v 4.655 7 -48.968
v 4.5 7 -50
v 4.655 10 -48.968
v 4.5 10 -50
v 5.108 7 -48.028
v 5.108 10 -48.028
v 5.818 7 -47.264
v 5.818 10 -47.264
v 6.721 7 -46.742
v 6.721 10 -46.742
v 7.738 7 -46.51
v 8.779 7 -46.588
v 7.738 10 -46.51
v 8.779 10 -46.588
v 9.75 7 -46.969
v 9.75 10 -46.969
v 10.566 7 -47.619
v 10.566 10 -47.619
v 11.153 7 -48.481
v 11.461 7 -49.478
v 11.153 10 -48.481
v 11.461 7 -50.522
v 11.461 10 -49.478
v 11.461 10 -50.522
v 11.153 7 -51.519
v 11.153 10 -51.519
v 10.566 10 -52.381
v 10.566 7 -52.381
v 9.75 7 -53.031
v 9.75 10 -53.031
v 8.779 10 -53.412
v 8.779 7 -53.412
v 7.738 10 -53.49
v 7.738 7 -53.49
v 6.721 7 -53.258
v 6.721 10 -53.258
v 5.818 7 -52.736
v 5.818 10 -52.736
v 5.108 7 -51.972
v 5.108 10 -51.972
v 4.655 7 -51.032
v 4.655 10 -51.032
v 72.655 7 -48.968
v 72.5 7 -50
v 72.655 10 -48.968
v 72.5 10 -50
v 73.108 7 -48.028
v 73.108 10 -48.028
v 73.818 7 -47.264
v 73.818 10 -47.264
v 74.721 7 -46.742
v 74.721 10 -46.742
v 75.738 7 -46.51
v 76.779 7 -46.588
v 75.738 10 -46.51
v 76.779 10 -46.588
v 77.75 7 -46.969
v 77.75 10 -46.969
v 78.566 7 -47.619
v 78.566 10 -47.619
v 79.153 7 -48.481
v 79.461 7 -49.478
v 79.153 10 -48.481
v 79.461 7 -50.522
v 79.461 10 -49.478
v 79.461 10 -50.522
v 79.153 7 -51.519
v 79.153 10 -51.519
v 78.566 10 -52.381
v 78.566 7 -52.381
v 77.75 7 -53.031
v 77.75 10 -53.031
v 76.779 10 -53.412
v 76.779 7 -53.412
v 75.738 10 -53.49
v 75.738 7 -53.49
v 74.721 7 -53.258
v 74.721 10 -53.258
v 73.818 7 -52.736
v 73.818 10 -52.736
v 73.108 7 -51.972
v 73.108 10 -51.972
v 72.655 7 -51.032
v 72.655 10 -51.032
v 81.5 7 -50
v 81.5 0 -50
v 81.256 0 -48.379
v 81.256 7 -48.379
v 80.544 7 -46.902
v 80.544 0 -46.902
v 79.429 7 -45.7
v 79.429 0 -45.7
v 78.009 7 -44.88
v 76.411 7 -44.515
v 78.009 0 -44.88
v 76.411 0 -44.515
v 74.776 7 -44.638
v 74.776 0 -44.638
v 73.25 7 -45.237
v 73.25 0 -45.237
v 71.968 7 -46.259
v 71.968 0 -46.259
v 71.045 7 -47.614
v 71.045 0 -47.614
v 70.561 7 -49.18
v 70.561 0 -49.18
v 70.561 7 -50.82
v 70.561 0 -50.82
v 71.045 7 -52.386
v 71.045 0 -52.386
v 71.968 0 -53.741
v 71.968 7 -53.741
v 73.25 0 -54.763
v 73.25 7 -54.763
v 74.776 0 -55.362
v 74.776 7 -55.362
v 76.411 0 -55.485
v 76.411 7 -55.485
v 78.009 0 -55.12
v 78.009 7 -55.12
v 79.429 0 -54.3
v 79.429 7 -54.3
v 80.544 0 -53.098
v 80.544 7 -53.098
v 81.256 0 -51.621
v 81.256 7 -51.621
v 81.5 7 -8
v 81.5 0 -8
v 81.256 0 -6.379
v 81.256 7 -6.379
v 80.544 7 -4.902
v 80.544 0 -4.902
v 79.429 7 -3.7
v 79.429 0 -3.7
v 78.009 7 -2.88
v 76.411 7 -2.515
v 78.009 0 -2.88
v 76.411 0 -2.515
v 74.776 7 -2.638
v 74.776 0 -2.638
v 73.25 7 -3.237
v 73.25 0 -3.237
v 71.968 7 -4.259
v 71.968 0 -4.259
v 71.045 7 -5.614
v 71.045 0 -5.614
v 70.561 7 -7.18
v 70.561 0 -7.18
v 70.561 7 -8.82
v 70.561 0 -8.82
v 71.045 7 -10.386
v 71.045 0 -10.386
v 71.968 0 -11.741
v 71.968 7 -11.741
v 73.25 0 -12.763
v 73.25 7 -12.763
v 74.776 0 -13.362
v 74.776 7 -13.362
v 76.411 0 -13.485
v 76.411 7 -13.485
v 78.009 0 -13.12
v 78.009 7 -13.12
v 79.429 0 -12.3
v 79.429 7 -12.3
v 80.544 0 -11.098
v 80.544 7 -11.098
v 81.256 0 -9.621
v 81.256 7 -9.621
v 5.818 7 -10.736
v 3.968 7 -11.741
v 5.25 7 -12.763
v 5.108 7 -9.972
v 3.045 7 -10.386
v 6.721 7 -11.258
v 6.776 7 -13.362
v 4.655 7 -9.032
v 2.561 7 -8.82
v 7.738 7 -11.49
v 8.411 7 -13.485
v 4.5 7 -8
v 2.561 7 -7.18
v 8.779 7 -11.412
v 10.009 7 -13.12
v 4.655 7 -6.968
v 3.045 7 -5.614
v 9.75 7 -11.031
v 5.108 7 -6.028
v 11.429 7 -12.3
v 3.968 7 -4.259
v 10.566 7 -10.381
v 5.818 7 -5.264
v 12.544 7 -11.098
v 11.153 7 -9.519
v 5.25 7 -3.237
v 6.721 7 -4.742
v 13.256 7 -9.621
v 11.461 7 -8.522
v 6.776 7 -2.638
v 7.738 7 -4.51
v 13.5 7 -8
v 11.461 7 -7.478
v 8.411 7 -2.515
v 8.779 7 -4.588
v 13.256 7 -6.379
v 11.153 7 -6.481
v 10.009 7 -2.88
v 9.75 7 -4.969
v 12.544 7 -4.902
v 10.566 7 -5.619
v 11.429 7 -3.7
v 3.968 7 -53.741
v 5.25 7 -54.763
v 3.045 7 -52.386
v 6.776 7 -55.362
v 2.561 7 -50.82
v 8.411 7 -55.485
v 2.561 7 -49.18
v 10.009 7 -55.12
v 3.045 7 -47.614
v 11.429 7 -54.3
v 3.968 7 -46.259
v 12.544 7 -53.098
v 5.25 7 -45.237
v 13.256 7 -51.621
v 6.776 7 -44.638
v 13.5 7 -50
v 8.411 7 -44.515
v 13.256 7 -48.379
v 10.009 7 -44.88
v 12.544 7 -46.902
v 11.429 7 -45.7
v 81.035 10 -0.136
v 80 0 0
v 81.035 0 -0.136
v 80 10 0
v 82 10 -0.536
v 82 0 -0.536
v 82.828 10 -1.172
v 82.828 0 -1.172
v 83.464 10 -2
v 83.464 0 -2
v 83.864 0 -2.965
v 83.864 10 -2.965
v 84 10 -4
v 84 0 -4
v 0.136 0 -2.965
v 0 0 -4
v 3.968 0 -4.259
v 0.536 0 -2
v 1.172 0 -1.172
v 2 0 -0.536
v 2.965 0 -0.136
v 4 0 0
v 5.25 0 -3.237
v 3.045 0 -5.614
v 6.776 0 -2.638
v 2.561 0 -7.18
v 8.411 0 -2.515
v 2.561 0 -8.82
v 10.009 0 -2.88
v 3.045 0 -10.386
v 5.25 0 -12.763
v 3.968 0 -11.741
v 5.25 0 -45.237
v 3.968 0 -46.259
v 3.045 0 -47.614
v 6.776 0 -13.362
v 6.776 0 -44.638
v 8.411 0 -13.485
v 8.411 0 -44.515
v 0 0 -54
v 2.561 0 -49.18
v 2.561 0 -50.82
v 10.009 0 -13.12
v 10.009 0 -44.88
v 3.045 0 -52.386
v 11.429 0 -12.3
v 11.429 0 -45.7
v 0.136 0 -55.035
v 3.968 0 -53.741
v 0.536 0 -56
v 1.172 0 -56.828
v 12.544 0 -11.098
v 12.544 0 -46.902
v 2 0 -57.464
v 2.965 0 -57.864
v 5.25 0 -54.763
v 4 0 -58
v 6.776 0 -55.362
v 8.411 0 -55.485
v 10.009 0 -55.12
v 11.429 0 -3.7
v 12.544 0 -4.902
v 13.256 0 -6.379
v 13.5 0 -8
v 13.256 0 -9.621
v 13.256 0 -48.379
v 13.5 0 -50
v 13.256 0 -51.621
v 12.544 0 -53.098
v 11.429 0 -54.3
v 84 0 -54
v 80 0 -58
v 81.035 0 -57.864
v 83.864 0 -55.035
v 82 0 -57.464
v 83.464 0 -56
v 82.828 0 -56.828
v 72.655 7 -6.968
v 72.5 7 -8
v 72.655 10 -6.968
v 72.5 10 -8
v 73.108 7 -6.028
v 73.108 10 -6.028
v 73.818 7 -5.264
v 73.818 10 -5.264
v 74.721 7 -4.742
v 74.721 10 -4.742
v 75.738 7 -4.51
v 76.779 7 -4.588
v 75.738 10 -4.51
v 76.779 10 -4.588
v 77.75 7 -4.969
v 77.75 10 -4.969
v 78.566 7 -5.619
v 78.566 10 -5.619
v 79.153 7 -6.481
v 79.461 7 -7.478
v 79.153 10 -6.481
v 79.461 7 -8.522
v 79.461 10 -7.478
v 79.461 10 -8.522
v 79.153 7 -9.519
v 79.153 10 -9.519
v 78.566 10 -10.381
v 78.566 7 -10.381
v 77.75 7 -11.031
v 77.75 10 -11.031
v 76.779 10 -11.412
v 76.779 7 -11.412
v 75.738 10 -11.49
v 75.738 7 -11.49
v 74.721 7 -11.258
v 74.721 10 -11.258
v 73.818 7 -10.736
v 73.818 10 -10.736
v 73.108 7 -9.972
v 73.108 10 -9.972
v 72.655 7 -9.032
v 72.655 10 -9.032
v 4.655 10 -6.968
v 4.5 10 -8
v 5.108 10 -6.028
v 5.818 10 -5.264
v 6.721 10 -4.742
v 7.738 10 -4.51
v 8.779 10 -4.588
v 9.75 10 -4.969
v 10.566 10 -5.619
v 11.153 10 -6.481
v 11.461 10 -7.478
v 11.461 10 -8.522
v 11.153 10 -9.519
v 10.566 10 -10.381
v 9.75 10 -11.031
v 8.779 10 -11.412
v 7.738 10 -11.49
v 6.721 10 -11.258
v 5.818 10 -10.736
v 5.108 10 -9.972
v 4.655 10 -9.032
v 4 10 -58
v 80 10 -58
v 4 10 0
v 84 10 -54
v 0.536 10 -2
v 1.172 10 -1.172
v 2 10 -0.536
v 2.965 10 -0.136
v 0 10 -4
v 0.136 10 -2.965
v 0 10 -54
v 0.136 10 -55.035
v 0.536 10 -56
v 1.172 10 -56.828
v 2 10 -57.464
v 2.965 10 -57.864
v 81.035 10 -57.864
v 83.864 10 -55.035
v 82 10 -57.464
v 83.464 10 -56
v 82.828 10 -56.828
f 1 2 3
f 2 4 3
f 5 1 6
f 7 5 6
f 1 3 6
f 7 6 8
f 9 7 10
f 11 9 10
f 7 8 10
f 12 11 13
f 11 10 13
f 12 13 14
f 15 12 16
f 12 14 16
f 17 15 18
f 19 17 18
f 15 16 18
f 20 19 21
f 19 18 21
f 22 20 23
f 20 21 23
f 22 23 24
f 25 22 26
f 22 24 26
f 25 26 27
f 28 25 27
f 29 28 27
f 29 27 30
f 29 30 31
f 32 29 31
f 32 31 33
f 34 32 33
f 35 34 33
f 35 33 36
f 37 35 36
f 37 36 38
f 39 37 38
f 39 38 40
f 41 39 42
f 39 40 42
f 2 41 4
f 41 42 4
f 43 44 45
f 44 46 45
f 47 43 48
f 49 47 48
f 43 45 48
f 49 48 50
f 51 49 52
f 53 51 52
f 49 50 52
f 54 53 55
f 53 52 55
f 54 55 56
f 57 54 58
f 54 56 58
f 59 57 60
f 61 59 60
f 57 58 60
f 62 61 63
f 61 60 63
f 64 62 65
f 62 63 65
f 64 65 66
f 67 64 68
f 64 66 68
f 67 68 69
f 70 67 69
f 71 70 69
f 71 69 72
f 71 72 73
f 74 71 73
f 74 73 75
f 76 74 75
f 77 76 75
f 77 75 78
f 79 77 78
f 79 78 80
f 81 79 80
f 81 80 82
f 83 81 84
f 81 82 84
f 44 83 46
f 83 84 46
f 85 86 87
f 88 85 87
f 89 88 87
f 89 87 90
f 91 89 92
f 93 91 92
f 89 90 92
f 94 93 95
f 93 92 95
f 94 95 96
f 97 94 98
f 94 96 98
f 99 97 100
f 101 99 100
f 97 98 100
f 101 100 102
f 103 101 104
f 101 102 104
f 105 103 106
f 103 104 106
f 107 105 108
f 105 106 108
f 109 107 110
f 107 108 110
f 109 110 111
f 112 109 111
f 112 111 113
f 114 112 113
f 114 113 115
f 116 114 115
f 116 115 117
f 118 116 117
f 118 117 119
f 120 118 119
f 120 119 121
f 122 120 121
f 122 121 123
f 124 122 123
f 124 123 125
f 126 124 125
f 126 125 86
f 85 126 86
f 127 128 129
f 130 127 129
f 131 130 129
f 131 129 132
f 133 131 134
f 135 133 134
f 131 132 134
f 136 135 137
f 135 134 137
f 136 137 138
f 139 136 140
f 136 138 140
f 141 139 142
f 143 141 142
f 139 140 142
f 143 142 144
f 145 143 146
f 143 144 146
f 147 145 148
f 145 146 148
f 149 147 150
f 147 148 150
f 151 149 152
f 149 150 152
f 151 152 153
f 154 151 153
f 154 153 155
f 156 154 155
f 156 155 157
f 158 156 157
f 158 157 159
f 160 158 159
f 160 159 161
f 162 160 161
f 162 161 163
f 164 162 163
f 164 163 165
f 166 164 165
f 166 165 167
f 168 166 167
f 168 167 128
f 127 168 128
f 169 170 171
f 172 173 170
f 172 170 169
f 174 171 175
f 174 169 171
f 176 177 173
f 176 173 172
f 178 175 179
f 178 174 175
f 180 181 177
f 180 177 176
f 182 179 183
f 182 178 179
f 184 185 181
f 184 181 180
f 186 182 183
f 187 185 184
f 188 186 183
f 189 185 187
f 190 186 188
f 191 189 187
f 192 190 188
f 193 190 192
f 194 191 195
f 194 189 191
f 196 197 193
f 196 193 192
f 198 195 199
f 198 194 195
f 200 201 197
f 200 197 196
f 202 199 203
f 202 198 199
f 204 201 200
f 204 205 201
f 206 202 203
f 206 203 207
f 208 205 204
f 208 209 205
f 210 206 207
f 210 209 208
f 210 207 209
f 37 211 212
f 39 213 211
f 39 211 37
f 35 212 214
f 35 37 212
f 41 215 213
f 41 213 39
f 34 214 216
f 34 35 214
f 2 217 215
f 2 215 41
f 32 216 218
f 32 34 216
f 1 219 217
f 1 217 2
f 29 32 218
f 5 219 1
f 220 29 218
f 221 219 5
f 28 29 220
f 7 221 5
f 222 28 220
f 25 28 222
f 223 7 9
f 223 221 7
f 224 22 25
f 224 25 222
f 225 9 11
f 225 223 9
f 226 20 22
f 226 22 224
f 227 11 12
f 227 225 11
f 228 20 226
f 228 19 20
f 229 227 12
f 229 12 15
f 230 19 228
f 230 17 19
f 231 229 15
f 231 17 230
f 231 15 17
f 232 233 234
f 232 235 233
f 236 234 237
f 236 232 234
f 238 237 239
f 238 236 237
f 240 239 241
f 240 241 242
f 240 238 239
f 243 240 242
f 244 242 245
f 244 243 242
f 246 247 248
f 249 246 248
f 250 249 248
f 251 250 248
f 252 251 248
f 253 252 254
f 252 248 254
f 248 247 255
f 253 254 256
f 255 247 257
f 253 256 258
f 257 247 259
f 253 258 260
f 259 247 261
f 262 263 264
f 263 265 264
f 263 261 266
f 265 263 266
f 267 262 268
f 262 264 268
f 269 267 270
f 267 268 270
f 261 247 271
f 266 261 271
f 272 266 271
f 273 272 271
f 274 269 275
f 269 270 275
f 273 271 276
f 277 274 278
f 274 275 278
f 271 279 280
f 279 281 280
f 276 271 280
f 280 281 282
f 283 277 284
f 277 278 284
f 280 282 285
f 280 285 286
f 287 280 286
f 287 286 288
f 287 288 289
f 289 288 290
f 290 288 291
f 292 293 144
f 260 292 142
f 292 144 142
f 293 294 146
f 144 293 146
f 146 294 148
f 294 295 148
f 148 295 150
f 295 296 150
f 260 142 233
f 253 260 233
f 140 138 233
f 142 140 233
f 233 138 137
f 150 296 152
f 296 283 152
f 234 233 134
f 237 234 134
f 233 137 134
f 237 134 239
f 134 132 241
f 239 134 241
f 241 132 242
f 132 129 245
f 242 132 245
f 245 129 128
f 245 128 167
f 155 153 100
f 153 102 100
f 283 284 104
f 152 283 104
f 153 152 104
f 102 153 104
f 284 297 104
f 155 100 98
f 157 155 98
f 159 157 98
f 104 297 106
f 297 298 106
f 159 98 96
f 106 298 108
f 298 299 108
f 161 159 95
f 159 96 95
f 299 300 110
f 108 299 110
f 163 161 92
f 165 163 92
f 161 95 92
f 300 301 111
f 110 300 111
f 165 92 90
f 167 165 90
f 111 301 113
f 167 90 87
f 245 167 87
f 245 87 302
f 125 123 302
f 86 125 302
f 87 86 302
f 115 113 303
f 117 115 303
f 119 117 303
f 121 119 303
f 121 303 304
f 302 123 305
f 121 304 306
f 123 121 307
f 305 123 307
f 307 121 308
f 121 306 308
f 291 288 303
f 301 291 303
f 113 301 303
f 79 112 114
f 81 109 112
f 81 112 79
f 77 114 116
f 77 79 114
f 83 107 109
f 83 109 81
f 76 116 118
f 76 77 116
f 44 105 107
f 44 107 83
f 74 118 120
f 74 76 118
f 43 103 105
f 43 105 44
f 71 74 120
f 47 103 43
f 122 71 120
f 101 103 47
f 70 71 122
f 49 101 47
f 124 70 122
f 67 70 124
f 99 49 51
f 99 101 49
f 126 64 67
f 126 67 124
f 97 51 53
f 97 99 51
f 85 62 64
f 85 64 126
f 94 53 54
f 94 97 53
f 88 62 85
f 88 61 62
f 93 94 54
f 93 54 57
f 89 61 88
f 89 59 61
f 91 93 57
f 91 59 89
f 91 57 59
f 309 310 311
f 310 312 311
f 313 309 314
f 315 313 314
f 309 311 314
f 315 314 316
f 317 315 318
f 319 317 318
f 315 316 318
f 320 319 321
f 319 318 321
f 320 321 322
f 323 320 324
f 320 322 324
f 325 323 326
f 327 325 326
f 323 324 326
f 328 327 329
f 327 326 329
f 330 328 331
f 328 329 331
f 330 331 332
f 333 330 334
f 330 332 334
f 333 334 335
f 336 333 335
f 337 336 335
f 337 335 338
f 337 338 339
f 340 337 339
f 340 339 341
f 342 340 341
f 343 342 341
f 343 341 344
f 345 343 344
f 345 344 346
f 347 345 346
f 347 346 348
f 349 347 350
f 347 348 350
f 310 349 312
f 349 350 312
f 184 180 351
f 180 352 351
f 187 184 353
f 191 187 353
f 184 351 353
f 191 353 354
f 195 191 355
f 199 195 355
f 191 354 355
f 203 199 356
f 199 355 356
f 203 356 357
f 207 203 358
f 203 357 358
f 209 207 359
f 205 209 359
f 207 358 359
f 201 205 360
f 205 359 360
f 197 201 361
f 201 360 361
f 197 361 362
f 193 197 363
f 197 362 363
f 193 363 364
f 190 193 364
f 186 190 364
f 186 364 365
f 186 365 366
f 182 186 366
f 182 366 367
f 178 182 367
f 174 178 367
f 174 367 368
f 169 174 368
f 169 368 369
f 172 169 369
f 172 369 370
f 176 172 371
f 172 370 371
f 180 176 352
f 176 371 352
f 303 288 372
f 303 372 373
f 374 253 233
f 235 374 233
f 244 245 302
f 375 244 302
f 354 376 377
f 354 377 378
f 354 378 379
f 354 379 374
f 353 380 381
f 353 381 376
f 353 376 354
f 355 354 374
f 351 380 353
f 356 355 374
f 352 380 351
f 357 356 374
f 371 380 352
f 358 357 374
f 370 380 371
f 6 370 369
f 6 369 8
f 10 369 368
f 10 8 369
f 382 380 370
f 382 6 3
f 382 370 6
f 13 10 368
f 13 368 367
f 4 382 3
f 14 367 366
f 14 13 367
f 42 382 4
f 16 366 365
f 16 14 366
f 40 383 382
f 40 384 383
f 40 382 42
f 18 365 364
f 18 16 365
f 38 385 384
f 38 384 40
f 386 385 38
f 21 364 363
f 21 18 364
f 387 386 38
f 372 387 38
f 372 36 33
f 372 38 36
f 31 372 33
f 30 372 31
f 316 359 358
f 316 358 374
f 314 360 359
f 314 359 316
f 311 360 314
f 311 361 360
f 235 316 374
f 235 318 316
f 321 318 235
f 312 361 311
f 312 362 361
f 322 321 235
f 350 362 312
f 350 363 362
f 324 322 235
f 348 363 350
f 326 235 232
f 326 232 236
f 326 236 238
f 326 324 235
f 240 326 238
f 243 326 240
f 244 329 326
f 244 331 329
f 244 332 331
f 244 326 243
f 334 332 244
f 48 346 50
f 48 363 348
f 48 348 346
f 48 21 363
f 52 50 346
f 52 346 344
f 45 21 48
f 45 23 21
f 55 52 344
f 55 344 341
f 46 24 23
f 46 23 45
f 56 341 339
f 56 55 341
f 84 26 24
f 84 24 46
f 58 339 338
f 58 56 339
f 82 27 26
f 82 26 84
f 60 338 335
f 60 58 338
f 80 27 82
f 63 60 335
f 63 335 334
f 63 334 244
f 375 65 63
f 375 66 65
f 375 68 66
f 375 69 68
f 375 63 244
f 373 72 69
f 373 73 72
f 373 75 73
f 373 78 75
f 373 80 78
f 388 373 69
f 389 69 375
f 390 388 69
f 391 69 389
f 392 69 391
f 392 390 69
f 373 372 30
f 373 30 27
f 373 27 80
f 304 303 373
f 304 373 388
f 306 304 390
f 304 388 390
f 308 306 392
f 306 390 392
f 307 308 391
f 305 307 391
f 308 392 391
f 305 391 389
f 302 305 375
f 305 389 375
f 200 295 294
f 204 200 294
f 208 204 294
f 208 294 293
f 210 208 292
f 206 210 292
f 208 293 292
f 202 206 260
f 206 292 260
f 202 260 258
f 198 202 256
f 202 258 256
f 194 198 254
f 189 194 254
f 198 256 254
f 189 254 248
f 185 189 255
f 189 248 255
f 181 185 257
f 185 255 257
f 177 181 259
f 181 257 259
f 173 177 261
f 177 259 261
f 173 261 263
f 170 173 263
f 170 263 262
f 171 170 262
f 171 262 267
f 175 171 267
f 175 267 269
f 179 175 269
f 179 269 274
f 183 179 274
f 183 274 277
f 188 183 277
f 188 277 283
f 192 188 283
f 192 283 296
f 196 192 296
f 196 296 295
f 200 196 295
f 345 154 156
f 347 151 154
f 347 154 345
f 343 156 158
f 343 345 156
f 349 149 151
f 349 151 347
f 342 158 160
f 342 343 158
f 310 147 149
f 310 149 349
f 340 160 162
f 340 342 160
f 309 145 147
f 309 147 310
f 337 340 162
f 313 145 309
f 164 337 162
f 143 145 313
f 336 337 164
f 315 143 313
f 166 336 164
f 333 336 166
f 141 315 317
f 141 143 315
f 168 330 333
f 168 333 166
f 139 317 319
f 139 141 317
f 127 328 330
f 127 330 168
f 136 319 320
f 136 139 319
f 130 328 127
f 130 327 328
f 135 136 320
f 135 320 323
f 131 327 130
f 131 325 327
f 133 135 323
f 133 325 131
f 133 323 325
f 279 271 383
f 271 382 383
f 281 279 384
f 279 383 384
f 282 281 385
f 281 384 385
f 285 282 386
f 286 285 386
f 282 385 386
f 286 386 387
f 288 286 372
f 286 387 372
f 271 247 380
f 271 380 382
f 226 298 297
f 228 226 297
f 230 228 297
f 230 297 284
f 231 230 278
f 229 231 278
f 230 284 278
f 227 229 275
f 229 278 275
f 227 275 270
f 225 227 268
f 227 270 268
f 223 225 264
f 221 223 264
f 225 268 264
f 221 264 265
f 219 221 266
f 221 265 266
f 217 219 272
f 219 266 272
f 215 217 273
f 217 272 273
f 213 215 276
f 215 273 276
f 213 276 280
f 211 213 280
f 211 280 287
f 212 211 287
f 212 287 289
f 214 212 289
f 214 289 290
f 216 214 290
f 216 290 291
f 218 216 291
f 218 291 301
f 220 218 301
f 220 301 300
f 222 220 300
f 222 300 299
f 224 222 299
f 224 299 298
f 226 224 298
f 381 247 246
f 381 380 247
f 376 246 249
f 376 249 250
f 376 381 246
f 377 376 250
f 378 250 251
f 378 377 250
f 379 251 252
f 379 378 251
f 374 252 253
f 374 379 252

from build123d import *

# Parameters (mm, degrees)
SKETCH1_W                                     = 84
SKETCH1_H                                     = 58
EXTRUDE1_DEPTH                                = 10
CBORE_FOR_M6_HEX_SOCKET_HEAD_CAP1_D           = 7
CBORE_FOR_M6_HEX_SOCKET_HEAD_CAP1_CBORE_D     = 11
CBORE_FOR_M6_HEX_SOCKET_HEAD_CAP1_CBORE_DEPTH = 7
LPATTERN1_COUNT                               = 2
LPATTERN1_PITCH                               = 68
LPATTERN1_COUNT_DIR2                          = 2
LPATTERN1_PITCH_DIR2                          = 42
FILLET1_R                                     = 4


with BuildPart() as part:
    # Sketch1 → Extrude1 (new body)
    with BuildSketch(Plane(origin=(0, 0, 0), x_dir=(1, 0, 0), z_dir=(0, 1, 0))):
        with Locations((42, 29)):
            Rectangle(SKETCH1_W, SKETCH1_H)
    extrude(amount=EXTRUDE1_DEPTH)

    # CBORE for M6 Hex Socket Head Cap1 (through all)
    with Locations(Plane.XZ):
        with Locations((76, -50)):
            cbore_for_m6_hex_socket_head_cap1 = CounterBoreHole(CBORE_FOR_M6_HEX_SOCKET_HEAD_CAP1_D / 2, CBORE_FOR_M6_HEX_SOCKET_HEAD_CAP1_CBORE_D / 2, CBORE_FOR_M6_HEX_SOCKET_HEAD_CAP1_CBORE_DEPTH)

    # LPattern1: CBORE for M6 Hex Socket Head Cap1 2 × 2
    with Locations(*[(-i * LPATTERN1_PITCH, 0, j * LPATTERN1_PITCH_DIR2) for i in range(LPATTERN1_COUNT) for j in range(LPATTERN1_COUNT_DIR2) if (i, j) != (0, 0)]):
        add(cbore_for_m6_hex_socket_head_cap1, mode=Mode.SUBTRACT)

    # Fillet1
    fillet1_edges = [part.edges().sort_by_distance(p)[0] for p in [
        (0, 5, -58),
        (84, 5, -58),
        (84, 5, 0),
        (0, 5, 0),
    ]]
    fillet(fillet1_edges, radius=FILLET1_R)


solid = part.part
